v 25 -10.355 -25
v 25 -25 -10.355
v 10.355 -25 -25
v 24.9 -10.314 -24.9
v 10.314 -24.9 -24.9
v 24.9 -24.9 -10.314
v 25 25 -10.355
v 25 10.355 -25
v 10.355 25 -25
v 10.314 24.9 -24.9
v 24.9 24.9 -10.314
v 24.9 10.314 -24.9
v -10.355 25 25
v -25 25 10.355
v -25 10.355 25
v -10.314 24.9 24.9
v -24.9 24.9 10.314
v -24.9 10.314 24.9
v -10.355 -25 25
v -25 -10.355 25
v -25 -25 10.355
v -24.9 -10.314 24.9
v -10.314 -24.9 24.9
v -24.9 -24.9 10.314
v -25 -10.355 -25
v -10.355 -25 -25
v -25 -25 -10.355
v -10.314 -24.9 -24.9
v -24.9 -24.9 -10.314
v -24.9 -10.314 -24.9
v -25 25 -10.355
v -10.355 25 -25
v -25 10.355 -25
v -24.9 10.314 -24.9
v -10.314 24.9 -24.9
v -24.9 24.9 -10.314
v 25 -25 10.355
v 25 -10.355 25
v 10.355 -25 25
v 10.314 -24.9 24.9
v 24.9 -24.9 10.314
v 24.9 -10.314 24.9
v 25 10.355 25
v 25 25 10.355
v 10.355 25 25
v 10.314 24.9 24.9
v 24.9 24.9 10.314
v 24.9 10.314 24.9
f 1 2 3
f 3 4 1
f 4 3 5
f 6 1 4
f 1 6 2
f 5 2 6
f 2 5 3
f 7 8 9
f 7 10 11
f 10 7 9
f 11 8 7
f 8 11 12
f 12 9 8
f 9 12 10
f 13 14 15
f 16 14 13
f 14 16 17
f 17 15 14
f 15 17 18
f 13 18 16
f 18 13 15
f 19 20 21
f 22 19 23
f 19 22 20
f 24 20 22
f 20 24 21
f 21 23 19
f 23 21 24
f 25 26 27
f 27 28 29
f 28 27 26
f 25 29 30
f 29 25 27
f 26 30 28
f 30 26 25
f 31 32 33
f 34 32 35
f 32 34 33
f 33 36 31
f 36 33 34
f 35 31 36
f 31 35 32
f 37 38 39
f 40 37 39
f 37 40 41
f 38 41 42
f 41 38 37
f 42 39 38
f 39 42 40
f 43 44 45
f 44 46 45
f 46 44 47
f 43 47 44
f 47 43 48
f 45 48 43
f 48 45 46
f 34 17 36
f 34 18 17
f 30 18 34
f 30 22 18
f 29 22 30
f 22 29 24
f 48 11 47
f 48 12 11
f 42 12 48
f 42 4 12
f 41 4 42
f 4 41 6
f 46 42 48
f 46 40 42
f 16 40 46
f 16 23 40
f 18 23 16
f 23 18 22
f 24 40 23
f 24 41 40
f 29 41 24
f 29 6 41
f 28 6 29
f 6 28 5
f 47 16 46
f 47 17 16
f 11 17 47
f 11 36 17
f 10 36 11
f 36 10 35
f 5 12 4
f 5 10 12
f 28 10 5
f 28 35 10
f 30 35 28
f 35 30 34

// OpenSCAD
/*
    test case : truncated cube
    from "Two Color Archimedean Solids - "
    http://www.thingiverse.com/thing:19168
*/

union()
{
    // create the black pieces first so they
    // are embedded in cube
    color("black")
    faces3();

    color ("red")
    scale(2.49)
    trunc_cube();
}


module trunc_cube()
{

  /*
      truncated cube
     coordinates from Wikipedia
     triangles by pmoews
  */
polyhedron
       (points = [
                 [   4.14214,  10.00000,  10.00000],
                 [   4.14214, -10.00000,  10.00000],
                 [  -4.14214,  10.00000,  10.00000],
                 [  -4.14214, -10.00000,  10.00000],
                 [  10.00000,   4.14214,  10.00000],
                 [  10.00000,  -4.14214,  10.00000],
                 [ -10.00000,   4.14214,  10.00000],
                 [ -10.00000,  -4.14214,  10.00000],
                 [  10.00000,  10.00000,   4.14214],
                 [  10.00000, -10.00000,   4.14214],
                 [ -10.00000,  10.00000,   4.14214],
                 [ -10.00000, -10.00000,   4.14214],
                 [  10.00000,  10.00000,  -4.14214],
                 [  10.00000, -10.00000,  -4.14214],
                 [ -10.00000,  10.00000,  -4.14214],
                 [ -10.00000, -10.00000,  -4.14214],
                 [   4.14214,  10.00000, -10.00000],
                 [   4.14214, -10.00000, -10.00000],
                 [  -4.14214,  10.00000, -10.00000],
                 [  -4.14214, -10.00000, -10.00000],
                 [  10.00000,   4.14214, -10.00000],
                 [  10.00000,  -4.14214, -10.00000],
                 [ -10.00000,   4.14214, -10.00000],
                 [ -10.00000,  -4.14214, -10.00000],
                ],
           faces = [
                 [    0,    6,    2],[    4,    6,    0],
                 [    5,    6,    4],[    1,    6,    5],
                 [    3,    6,    1],[    7,    6,    3],
                 

                 [   22,   16,   18],[   20,   22,   21],
                 [   16,   22,   20],[   22,   17,   21],
                 [   22,   19,   17],[   22,   23,   19],
                 
                 [    8,    5,    4],[   12,    5,    8],
                 [   20,    5,   12],[   21,    5,   20],
                 [   13,    5,   21],[   13,    9,    5],
                 
                 [    7,   10,    6],[    7,   14,   10],
                 [    7,   22,   14],[    7,   23,   22],
                 [    7,   15,   23],[   11,   15,    7],
                 
                 [    2,    8,    0],[    2,   12,    8],
                 [    2,   16,   12],[    2,   18,   16],
                 [    2,   14,   18],[   10,   14,    2],
                 
                 [    9,    3,    1],[   13,    3,    9],
                 [   17,    3,   13],[   19,    3,   17],
                 [   15,    3,   19],[   15,   11,    3],
                 
                 [    4,    0,    8],[    2,    6,   10],
                 [    7,    3,   11],[    1,    5,    9],
                 [   16,   20,   12],[   21,   17,   13],
                 
                 [   22,   18,   14],[   19,   23,   15],

]
      );

}


  module faces3()
{




/*
   truncated cube
     coordinates from Wolfram/alpha
     triangles by pmoews  triangular faces
*/
polyhedron
       (points = [
                 [  10.35534,  25.00000,  25.00000],
                 [  10.35534,  25.00000, -25.00000],
                 [  10.35534, -25.00000,  25.00000],
                 [  10.35534, -25.00000, -25.00000],
                 [ -10.35534,  25.00000,  25.00000],
                 [ -10.35534,  25.00000, -25.00000],
                 [ -10.35534, -25.00000,  25.00000],
                 [ -10.35534, -25.00000, -25.00000],
                 [  25.00000,  10.35534,  25.00000],
                 [  25.00000,  10.35534, -25.00000],
                 [  25.00000, -10.35534,  25.00000],
                 [  25.00000, -10.35534, -25.00000],
                 [ -25.00000,  10.35534,  25.00000],
                 [ -25.00000,  10.35534, -25.00000],
                 [ -25.00000, -10.35534,  25.00000],
                 [ -25.00000, -10.35534, -25.00000],
                 [  25.00000,  25.00000,  10.35534],
                 [  25.00000,  25.00000, -10.35534],
                 [  25.00000, -25.00000,  10.35534],
                 [  25.00000, -25.00000, -10.35534],
                 [ -25.00000,  25.00000,  10.35534],
                 [ -25.00000,  25.00000, -10.35534],
                 [ -25.00000, -25.00000,  10.35534],
                 [ -25.00000, -25.00000, -10.35534],
                 [   9.31980,  22.50000,  22.50000],
                 [   9.31980,  22.50000, -22.50000],
                 [   9.31980, -22.50000,  22.50000],
                 [   9.31980, -22.50000, -22.50000],
                 [  -9.31980,  22.50000,  22.50000],
                 [  -9.31980,  22.50000, -22.50000],
                 [  -9.31980, -22.50000,  22.50000],
                 [  -9.31980, -22.50000, -22.50000],
                 [  22.50000,   9.31980,  22.50000],
                 [  22.50000,   9.31980, -22.50000],
                 [  22.50000,  -9.31980,  22.50000],
                 [  22.50000,  -9.31980, -22.50000],
                 [ -22.50000,   9.31980,  22.50000],
                 [ -22.50000,   9.31980, -22.50000],
                 [ -22.50000,  -9.31980,  22.50000],
                 [ -22.50000,  -9.31980, -22.50000],
                 [  22.50000,  22.50000,   9.31980],
                 [  22.50000,  22.50000,  -9.31980],
                 [  22.50000, -22.50000,   9.31980],
                 [  22.50000, -22.50000,  -9.31980],
                 [ -22.50000,  22.50000,   9.31980],
                 [ -22.50000,  22.50000,  -9.31980],
                 [ -22.50000, -22.50000,   9.31980],
                 [ -22.50000, -22.50000,  -9.31980],
                ],
           faces = [
                 [   27,   35,   43],[   11,    3,   19],
                 [   27,    3,   11],[   11,   35,   27],
                 [   35,   11,   19],[   19,   43,   35],
                 [   43,   19,    3],[   27,   43,    3],
                 
                 [   25,   41,   33],[   17,    1,    9],
                 [   25,    1,   17],[   17,   41,   25],
                 [   41,   17,    9],[    9,   33,   41],
                 [   33,    9,    1],[   25,   33,    1],
                 
                 [   28,   44,   36],[   20,    4,   12],
                 [   28,    4,   20],[   20,   44,   28],
                 [   44,   20,   12],[   12,   36,   44],
                 [   36,   12,    4],[   28,   36,    4],
                 
                 [   30,   38,   46],[   14,    6,   22],
                 [   30,    6,   14],[   14,   38,   30],
                 [   38,   14,   22],[   22,   46,   38],
                 [   46,   22,    6],[   30,   46,    6],
                 
                 [   31,   47,   39],[   23,    7,   15],
                 [   31,    7,   23],[   23,   47,   31],
                 [   47,   23,   15],[   15,   39,   47],
                 [   39,   15,    7],[   31,   39,    7],
                 
                 [   29,   37,   45],[   13,    5,   21],
                 [   29,    5,   13],[   13,   37,   29],
                 [   37,   13,   21],[   21,   45,   37],
                 [   45,   21,    5],[   29,   45,    5],
                 
                 [   26,   42,   34],[   18,    2,   10],
                 [   26,    2,   18],[   18,   42,   26],
                 [   42,   18,   10],[   10,   34,   42],
                 [   34,   10,    2],[   26,   34,    2],
        

                 
                 [   32,   40,   24],[   8,    0,    16],
                 [   16,    0,   24],[   24,   40,   16],
                 [   8,   16,    40],[    40,   32,   8],
                 [   0,    8,    32],[   0,   32,    24],
            ]
      );

}
